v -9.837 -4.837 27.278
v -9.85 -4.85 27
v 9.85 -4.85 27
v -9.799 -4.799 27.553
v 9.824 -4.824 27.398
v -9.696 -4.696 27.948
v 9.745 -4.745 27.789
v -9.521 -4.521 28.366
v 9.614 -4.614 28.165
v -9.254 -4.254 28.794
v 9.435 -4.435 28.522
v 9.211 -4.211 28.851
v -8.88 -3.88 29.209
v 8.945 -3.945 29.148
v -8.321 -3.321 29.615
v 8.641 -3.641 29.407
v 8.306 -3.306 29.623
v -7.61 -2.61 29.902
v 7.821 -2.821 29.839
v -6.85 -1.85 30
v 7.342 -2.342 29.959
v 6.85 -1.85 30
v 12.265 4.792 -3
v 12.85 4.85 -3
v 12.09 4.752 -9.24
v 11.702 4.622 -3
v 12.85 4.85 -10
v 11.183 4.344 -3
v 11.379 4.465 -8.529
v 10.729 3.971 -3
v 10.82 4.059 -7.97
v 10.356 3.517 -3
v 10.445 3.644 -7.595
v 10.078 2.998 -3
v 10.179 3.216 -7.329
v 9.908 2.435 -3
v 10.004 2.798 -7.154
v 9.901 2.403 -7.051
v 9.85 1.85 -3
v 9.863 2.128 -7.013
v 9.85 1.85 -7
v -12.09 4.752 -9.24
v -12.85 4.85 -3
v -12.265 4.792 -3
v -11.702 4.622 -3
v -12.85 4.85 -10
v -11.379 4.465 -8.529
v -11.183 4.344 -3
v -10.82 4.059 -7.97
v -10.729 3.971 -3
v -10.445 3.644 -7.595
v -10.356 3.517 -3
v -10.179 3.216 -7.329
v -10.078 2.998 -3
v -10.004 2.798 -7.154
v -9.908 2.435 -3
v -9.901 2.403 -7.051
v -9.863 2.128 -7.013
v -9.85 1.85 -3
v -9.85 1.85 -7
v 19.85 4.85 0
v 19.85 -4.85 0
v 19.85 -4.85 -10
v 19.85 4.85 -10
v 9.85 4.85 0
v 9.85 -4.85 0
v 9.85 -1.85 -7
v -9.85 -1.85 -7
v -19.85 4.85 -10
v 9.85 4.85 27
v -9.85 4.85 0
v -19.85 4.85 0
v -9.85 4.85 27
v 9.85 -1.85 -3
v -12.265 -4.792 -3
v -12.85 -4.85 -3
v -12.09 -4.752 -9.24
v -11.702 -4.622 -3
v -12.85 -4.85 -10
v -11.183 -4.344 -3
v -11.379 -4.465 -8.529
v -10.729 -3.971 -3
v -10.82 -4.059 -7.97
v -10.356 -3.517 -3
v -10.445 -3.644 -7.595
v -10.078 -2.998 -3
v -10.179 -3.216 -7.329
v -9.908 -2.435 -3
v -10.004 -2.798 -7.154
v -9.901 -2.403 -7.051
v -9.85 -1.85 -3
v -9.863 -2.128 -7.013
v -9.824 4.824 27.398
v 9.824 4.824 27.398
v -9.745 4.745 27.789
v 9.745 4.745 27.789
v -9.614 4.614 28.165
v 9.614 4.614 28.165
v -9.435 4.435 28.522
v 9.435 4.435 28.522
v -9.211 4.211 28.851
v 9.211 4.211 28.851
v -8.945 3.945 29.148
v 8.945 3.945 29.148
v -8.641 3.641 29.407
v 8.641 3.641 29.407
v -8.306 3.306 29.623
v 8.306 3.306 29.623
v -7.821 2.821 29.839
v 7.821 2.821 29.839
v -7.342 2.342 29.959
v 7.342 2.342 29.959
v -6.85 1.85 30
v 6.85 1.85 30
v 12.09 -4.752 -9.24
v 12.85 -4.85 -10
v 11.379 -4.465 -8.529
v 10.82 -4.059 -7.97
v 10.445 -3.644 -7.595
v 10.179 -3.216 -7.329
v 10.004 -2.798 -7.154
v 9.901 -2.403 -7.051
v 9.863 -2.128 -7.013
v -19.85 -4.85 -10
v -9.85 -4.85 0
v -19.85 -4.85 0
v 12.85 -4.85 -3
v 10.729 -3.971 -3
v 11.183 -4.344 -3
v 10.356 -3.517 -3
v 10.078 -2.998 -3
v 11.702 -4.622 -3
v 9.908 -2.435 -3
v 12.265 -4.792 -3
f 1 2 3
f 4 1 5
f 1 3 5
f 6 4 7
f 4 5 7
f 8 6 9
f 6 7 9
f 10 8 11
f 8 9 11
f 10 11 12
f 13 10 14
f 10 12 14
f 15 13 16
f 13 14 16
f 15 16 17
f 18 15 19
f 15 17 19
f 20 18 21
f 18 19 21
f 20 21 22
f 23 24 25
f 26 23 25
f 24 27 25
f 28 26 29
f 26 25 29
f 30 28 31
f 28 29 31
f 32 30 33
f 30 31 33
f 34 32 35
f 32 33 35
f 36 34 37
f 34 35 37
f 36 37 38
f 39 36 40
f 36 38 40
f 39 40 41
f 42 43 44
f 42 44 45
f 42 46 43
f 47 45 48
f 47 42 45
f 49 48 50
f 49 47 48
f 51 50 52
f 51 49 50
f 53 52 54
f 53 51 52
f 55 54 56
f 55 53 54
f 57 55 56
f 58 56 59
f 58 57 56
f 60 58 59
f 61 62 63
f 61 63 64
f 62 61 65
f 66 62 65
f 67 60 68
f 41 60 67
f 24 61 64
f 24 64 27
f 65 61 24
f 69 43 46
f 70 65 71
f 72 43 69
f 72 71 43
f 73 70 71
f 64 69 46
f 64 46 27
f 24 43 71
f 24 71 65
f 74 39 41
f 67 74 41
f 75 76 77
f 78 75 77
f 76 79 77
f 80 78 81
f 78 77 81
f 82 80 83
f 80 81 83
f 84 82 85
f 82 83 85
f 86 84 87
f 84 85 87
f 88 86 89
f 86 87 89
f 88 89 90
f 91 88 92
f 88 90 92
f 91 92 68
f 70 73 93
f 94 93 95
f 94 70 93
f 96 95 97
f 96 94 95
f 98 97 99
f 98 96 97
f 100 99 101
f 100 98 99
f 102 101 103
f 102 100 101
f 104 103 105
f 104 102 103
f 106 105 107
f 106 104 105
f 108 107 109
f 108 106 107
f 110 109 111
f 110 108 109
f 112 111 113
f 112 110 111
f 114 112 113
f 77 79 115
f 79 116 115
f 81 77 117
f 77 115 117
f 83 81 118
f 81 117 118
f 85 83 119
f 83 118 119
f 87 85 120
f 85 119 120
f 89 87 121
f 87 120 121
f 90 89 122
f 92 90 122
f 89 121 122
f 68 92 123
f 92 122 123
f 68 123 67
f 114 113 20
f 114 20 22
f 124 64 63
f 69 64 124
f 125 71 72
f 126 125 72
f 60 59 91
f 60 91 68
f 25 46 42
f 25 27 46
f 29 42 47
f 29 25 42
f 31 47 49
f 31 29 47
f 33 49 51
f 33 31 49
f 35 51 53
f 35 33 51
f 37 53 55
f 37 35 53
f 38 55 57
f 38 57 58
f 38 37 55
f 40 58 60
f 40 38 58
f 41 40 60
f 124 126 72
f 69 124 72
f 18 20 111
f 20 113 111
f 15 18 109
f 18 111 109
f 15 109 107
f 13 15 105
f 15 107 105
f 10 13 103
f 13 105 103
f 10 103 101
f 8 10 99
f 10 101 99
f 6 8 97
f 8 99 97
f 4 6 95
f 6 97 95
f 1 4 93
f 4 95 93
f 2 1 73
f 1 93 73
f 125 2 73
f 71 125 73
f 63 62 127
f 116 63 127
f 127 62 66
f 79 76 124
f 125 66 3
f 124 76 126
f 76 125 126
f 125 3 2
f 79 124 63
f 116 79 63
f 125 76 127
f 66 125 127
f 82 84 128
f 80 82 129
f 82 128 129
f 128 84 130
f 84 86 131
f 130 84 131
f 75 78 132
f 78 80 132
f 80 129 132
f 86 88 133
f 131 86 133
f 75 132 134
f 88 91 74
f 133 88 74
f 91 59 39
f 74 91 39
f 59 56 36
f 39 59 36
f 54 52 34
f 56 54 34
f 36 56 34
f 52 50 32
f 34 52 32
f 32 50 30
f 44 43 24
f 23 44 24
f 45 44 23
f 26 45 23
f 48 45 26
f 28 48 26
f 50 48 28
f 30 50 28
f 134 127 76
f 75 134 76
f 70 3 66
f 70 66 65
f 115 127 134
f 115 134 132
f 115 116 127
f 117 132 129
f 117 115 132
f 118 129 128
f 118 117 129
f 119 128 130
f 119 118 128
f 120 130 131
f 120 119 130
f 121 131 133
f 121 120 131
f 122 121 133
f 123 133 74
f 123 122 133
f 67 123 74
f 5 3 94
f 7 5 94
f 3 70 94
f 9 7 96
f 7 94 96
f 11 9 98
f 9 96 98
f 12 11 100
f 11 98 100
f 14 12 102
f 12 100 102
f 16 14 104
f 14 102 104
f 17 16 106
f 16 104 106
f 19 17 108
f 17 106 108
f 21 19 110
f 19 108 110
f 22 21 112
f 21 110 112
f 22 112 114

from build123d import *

# Parameters (mm, degrees)
SKETCH1_W           = 19.7
SKETCH1_H           = 9.7
BOSS_EXTRUDE1_DEPTH = 30
SKETCH2_W           = 39.7
SKETCH2_H           = 9.7
BOSS_EXTRUDE2_DEPTH = 10
SKETCH3_W           = 19.7
SKETCH3_H           = 4
CUT_EXTRUDE1_DEPTH  = 10
FILLET1_R           = 3
FILLET2_R           = 3


with BuildPart() as part:
    # Sketch1 → Boss-Extrude1 (new body)
    with BuildSketch(Plane.XY):
        Rectangle(SKETCH1_W, SKETCH1_H)
    extrude(amount=BOSS_EXTRUDE1_DEPTH)

    # Sketch2 → Boss-Extrude2 (add)
    with BuildSketch(Plane(origin=(0, 0, 0), x_dir=(-1, 0, 0), z_dir=(0, 0, -1))):
        Rectangle(SKETCH2_W, SKETCH2_H)
    extrude(amount=BOSS_EXTRUDE2_DEPTH)

    # Sketch3 → Cut-Extrude1 (cut)
    with BuildSketch(Plane(origin=(0, 4.85, 0), x_dir=(1, 0, 0), z_dir=(0, 1, 0))):
        with Locations((0, 5)):
            Rectangle(SKETCH3_W, SKETCH3_H)
    extrude(amount=-CUT_EXTRUDE1_DEPTH, mode=Mode.SUBTRACT)

    # Fillet1
    fillet1_edges = [part.edges().sort_by_distance(p)[0] for p in [
        (-9.85, -4.85, -5),
        (0, -4.85, -7),
        (9.85, -4.85, -5),
        (-9.85, 4.85, -5),
        (9.85, 4.85, -5),
        (0, 4.85, -7),
    ]]
    fillet(fillet1_edges, radius=FILLET1_R - 0.0001)  # a hair under: the kernel refuses the full size

    # Fillet2
    fillet2_edges = [part.edges().sort_by_distance(p)[0] for p in [
        (9.85, 0, 30),
        (0, 4.85, 30),
        (-9.85, 0, 30),
        (0, -4.85, 30),
    ]]
    fillet(fillet2_edges, radius=FILLET2_R)


solid = part.part
